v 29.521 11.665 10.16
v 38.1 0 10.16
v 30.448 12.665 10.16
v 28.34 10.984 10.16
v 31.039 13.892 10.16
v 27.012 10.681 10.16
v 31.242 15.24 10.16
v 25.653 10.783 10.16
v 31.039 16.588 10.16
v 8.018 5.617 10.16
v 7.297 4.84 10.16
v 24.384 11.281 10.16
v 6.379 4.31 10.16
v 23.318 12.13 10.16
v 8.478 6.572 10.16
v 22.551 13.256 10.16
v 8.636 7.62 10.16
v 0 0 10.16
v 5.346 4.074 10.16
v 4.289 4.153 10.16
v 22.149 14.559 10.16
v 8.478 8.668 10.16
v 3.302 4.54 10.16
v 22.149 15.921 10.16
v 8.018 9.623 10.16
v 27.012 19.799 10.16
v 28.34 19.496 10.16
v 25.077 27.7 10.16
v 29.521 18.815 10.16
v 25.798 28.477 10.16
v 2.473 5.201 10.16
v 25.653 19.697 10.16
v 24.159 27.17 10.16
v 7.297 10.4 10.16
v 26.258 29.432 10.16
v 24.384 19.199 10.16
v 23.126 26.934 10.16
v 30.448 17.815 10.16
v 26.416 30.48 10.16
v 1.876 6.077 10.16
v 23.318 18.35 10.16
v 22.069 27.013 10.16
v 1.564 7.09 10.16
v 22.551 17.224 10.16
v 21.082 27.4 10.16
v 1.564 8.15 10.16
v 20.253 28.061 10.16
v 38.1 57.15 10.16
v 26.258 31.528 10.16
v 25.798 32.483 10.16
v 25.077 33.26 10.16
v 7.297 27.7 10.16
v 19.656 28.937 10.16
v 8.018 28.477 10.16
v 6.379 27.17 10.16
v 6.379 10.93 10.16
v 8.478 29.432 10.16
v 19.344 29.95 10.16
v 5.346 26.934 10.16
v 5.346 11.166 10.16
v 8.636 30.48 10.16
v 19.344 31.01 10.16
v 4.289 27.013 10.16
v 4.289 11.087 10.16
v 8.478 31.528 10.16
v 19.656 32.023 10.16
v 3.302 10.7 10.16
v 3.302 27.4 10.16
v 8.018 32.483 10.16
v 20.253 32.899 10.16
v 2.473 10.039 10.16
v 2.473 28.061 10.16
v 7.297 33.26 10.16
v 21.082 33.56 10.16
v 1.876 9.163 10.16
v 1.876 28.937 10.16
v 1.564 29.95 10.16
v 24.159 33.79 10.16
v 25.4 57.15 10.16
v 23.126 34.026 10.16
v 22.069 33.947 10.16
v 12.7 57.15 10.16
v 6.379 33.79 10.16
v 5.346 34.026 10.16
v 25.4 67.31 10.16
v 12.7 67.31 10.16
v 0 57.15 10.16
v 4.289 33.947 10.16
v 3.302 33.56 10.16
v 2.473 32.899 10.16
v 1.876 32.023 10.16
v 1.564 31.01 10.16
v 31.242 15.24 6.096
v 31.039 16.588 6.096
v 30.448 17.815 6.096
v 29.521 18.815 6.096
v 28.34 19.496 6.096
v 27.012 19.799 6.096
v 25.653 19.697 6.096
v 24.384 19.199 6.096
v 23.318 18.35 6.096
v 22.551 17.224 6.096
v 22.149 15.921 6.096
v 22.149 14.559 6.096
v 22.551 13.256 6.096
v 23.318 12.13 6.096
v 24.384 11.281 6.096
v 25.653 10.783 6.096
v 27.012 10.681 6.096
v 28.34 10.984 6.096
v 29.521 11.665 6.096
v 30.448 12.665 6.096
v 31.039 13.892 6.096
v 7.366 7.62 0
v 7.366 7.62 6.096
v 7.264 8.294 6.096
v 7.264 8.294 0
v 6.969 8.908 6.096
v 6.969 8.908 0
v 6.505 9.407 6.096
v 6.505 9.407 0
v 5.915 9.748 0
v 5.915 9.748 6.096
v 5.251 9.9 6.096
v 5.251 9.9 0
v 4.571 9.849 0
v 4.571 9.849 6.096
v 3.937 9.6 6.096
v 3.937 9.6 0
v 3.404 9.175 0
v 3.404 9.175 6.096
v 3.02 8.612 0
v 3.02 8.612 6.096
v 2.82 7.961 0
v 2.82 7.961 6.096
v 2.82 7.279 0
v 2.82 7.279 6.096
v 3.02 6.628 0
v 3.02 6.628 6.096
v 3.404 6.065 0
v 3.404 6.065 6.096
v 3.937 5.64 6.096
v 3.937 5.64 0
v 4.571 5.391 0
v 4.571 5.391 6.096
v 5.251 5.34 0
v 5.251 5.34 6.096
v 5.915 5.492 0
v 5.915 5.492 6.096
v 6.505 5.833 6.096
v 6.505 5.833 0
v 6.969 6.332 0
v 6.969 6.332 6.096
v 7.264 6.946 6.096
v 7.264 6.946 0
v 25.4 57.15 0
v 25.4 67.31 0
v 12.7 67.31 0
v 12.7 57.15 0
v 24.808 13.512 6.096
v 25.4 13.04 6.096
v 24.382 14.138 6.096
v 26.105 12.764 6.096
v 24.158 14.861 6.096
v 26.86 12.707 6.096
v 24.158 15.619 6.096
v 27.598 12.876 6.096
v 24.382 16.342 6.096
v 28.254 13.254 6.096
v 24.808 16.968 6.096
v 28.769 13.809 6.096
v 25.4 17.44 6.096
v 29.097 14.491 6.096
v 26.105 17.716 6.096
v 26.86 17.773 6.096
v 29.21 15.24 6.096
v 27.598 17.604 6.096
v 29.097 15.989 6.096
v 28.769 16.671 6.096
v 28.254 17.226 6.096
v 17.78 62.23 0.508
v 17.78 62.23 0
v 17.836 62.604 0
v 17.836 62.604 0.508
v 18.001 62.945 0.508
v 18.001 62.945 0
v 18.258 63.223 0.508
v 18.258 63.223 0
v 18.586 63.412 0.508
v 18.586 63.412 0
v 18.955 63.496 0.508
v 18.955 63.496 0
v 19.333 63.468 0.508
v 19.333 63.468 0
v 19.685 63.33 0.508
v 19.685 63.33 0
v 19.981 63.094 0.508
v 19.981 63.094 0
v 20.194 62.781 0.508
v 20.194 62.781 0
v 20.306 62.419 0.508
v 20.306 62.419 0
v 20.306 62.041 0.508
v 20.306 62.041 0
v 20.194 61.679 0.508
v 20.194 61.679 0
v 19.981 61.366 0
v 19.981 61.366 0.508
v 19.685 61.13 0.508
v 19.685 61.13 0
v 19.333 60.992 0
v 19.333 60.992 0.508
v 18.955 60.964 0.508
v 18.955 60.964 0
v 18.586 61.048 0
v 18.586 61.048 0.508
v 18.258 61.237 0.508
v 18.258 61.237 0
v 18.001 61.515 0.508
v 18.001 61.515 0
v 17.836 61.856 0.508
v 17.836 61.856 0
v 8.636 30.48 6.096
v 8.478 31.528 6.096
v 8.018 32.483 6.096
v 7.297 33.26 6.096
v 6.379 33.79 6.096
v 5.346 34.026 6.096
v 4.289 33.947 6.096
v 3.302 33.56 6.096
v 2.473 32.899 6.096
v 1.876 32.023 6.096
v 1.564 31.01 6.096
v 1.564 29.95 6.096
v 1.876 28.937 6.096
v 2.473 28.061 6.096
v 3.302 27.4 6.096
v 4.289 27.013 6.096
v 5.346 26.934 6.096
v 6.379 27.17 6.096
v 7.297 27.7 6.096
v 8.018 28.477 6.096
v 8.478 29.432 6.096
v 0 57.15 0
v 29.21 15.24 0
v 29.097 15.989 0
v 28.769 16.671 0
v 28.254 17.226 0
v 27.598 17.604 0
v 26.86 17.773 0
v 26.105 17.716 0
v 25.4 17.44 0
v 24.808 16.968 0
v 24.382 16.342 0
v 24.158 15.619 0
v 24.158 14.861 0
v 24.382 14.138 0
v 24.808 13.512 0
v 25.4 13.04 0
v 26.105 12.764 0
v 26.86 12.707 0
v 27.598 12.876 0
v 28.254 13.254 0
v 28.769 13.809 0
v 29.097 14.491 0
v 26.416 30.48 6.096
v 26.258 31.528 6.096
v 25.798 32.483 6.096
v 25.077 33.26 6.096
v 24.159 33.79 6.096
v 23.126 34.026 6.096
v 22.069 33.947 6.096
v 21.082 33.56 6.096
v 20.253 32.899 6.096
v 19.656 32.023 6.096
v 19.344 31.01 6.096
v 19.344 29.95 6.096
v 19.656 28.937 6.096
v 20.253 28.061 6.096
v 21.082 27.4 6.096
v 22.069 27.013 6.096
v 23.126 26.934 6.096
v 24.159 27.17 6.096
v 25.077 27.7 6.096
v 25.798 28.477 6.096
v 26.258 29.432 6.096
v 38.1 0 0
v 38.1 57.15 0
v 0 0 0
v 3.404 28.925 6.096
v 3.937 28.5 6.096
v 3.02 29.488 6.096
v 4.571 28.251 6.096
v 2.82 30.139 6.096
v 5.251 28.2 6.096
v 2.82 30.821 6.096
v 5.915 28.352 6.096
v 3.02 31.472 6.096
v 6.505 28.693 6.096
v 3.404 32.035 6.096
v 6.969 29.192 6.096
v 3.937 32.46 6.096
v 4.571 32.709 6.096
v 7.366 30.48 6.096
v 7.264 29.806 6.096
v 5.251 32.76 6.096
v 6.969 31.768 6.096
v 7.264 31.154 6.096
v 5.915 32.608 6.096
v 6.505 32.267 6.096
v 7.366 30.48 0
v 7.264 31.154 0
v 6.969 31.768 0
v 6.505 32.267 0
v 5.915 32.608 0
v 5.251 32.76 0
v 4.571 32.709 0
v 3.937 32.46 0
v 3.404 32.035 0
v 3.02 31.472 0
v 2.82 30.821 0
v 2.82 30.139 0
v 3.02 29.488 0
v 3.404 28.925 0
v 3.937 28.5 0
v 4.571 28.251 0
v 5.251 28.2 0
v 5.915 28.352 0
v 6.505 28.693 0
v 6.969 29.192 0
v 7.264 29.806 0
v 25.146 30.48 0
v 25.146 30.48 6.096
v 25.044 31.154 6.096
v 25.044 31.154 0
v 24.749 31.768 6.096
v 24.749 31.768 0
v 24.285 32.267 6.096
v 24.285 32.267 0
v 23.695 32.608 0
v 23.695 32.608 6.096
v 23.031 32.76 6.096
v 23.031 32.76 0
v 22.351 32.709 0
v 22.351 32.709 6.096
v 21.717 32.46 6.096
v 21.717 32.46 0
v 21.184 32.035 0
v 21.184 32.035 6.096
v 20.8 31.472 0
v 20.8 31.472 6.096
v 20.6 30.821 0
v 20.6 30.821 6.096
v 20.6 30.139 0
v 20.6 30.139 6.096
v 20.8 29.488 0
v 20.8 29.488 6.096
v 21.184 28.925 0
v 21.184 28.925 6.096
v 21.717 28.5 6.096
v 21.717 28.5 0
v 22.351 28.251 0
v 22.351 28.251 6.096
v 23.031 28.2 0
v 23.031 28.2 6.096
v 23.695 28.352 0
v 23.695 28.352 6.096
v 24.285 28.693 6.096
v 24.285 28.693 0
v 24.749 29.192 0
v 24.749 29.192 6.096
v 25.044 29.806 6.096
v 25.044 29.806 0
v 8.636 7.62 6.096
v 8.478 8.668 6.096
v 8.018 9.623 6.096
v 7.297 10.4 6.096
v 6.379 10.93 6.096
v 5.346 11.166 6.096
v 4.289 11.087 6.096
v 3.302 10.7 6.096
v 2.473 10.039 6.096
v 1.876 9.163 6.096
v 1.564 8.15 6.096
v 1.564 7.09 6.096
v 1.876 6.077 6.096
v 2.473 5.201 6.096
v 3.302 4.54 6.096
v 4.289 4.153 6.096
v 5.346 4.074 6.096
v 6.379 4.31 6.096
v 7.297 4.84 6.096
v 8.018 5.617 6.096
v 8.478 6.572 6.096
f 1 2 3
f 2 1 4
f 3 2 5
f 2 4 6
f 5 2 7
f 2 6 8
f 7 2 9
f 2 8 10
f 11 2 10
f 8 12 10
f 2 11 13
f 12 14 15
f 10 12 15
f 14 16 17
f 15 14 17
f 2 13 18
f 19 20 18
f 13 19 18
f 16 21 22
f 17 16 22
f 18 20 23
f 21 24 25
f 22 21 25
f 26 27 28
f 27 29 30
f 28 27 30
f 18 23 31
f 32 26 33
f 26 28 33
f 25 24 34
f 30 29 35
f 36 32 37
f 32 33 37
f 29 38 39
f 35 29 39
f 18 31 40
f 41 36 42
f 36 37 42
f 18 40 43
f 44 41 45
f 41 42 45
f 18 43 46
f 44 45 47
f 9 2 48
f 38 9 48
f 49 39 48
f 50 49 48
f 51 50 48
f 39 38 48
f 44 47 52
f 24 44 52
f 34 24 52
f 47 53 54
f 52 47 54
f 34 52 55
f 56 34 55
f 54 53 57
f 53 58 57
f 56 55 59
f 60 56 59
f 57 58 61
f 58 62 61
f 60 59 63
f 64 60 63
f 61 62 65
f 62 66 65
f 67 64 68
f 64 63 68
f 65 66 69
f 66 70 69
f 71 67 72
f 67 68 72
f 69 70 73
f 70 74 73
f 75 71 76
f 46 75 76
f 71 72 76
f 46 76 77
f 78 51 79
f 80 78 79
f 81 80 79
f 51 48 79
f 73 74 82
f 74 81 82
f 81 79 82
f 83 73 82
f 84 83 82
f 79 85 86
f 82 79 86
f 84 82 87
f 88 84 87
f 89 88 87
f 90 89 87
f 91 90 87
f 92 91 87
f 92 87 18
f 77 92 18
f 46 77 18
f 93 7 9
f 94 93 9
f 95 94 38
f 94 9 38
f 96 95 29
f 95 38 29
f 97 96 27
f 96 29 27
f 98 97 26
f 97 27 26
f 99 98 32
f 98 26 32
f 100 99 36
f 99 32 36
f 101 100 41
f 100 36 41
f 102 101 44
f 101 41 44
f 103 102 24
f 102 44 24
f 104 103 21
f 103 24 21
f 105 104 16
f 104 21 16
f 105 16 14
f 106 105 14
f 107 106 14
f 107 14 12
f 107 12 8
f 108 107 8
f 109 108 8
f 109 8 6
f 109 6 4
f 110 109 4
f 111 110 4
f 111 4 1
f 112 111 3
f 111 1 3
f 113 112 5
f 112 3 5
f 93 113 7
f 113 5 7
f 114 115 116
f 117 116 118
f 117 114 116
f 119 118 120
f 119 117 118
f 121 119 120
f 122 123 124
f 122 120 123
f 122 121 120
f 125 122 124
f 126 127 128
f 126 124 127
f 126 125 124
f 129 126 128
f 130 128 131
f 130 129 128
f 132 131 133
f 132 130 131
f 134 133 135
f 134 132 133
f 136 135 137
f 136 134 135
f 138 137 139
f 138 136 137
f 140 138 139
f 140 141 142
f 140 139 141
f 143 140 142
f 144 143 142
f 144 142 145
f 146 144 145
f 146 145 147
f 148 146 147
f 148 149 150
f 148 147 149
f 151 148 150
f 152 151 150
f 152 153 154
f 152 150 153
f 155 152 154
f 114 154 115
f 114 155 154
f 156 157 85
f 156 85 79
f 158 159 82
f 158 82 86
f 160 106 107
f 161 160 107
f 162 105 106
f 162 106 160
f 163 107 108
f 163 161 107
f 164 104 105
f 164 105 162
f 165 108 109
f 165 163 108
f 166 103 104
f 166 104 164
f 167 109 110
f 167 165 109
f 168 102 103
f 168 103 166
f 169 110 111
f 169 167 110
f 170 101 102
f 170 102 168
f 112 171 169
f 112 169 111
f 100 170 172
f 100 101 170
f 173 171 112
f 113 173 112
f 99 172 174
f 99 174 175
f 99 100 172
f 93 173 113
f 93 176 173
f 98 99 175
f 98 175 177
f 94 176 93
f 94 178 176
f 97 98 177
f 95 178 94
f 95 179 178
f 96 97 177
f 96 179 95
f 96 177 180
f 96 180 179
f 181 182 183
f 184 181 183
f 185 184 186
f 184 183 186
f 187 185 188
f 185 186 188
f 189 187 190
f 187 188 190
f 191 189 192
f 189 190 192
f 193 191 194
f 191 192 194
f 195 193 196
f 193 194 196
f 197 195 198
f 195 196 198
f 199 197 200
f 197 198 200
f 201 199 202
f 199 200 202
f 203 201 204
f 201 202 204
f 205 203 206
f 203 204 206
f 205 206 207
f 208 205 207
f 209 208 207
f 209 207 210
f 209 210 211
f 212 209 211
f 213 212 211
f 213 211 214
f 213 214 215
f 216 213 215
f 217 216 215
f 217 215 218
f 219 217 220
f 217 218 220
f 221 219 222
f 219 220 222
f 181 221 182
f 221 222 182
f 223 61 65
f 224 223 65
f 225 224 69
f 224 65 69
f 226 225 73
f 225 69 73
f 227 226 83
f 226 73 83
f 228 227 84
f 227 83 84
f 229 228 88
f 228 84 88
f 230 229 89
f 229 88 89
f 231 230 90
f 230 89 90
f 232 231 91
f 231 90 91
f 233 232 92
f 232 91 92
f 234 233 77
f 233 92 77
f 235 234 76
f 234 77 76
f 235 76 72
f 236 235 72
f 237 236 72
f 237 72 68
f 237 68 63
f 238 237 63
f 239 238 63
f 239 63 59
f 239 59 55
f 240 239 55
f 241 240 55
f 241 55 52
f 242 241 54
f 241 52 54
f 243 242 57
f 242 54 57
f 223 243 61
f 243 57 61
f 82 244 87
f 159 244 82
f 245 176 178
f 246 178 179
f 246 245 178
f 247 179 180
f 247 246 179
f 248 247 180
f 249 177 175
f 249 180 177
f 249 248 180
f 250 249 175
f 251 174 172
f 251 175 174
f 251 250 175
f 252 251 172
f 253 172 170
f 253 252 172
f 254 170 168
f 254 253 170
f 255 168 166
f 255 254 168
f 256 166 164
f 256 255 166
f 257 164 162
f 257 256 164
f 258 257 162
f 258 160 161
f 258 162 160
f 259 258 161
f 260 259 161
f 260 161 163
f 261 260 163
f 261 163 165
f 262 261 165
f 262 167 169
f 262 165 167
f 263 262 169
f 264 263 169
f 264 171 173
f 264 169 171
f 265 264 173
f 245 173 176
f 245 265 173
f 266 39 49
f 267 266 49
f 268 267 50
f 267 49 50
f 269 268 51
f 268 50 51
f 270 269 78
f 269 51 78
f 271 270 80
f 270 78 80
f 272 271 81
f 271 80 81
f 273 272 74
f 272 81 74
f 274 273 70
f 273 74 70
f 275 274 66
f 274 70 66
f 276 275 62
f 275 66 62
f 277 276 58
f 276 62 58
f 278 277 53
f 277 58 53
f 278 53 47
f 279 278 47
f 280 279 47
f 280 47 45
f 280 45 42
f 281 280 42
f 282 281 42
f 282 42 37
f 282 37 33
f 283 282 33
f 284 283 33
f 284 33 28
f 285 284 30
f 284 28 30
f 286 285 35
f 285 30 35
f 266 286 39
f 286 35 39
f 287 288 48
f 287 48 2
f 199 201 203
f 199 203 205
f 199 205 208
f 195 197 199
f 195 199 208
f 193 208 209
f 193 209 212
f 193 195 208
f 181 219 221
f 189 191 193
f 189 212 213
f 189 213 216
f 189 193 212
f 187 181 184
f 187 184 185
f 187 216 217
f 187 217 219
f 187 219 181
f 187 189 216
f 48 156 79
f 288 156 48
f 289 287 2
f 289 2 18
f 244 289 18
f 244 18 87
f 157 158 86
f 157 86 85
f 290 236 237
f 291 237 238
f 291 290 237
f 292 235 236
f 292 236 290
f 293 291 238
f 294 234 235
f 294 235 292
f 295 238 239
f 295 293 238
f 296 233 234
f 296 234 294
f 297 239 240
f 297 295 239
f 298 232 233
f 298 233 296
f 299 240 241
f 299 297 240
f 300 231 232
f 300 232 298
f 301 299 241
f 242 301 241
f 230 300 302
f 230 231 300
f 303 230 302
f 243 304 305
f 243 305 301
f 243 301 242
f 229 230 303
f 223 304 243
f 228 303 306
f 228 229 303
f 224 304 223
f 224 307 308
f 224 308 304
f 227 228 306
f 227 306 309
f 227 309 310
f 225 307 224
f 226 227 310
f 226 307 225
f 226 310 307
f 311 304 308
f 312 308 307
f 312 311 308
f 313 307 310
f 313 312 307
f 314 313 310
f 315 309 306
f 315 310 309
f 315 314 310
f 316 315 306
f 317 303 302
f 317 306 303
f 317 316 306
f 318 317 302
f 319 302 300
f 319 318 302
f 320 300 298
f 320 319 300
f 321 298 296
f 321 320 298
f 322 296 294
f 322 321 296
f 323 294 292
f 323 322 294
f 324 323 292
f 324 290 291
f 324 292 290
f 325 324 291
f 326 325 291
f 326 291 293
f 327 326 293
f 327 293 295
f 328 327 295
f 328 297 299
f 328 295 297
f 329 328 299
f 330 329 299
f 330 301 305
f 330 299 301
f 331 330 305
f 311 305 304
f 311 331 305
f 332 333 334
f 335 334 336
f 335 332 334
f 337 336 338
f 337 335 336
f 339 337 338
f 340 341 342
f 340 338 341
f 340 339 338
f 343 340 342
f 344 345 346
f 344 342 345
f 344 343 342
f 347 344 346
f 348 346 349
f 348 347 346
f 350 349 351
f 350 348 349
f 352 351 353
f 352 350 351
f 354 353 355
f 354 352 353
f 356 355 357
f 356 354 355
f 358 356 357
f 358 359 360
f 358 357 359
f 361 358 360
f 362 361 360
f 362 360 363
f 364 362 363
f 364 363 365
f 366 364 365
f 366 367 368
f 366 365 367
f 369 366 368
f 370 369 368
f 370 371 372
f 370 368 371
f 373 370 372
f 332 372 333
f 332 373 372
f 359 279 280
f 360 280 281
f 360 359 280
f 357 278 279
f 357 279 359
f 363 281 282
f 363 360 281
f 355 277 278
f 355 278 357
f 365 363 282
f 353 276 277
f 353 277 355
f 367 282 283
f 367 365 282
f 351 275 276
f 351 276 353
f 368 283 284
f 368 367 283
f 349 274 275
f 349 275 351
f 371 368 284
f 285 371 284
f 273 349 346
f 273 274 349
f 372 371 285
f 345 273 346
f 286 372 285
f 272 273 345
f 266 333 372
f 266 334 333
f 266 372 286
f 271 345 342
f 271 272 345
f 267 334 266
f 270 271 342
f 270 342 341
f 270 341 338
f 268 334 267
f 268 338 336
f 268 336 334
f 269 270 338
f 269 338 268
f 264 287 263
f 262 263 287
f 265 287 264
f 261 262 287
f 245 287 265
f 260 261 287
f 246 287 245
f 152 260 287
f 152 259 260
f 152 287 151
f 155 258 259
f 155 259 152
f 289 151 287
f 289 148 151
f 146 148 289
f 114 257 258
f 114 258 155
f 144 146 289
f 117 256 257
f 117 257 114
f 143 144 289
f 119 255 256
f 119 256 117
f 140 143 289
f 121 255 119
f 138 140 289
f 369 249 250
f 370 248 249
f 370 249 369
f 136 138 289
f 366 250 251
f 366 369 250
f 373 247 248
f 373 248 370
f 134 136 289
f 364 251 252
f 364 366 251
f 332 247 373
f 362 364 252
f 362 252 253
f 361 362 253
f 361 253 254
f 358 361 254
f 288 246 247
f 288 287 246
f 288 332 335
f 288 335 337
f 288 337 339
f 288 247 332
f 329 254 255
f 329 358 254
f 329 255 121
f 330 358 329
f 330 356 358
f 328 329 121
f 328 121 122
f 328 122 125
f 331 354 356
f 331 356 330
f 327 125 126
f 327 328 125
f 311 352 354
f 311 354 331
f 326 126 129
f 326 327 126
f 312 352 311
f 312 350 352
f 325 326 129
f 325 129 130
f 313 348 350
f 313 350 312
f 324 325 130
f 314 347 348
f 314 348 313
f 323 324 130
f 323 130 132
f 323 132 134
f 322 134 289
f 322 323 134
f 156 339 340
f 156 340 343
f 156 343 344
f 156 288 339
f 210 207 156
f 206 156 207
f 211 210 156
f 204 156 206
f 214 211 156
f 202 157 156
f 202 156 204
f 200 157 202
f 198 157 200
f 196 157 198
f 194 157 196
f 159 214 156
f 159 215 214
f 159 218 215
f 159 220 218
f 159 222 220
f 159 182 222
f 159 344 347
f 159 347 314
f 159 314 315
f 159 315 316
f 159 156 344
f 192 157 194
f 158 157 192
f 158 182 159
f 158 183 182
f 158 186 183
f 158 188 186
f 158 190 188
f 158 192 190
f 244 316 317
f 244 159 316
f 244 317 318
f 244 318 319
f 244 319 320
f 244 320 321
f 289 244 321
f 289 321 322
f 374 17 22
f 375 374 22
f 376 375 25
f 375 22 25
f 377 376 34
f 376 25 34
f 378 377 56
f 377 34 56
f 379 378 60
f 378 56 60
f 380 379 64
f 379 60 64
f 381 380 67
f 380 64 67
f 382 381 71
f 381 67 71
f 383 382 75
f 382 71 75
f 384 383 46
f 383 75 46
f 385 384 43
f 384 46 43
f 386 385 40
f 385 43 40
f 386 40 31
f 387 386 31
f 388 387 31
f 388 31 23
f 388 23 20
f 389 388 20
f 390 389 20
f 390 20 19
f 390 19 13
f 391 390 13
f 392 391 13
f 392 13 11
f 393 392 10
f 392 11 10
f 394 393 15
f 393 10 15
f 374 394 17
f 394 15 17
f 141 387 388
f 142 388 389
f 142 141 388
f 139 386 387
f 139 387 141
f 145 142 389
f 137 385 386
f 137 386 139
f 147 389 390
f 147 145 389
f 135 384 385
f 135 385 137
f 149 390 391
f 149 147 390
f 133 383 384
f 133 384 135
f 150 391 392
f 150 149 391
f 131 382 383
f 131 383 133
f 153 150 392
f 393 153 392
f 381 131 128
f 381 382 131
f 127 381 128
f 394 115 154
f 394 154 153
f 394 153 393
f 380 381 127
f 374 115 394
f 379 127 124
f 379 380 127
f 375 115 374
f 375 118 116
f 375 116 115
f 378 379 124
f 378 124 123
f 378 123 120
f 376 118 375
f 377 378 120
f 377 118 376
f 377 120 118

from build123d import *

# Parameters (mm, degrees)
SKETCH1_R           = 2.286
SKETCH1_R_2         = 2.54
BOSS_EXTRUDE1_DEPTH = 10.16
SKETCH7_R           = 3.556
SKETCH7_R_2         = 4.572
CUT_EXTRUDE1_DEPTH  = 4.064
SKETCH3_R           = 1.27
CUT_EXTRUDE2_DEPTH  = 0.508


with BuildPart() as part:
    # Sketch1 → Boss-Extrude1 (new body)
    with BuildSketch(Plane.XY):
        Polygon((0, 57.15), (12.7, 57.15), (12.7, 67.31), (25.4, 67.31), (25.4, 57.15), (38.1, 57.15), (38.1, 0), (0, 0), align=None)
        with Locations((5.08, 7.62)):
            Circle(SKETCH1_R, mode=Mode.SUBTRACT)
        with Locations((5.08, 30.48)):
            Circle(SKETCH1_R, mode=Mode.SUBTRACT)
        with Locations((26.67, 15.24)):
            Circle(SKETCH1_R_2, mode=Mode.SUBTRACT)
        with Locations((22.86, 30.48)):
            Circle(SKETCH1_R, mode=Mode.SUBTRACT)
    extrude(amount=BOSS_EXTRUDE1_DEPTH)

    # Sketch7 → Cut-Extrude1 (cut)
    with BuildSketch(Plane.XY.offset(10.16)):
        with Locations((5.08, 30.48)):
            Circle(SKETCH7_R)
        with Locations((22.86, 30.48)):
            Circle(SKETCH7_R)
        with Locations((5.08, 7.62)):
            Circle(SKETCH7_R)
        with Locations((26.67, 15.24)):
            Circle(SKETCH7_R_2)
    extrude(amount=-CUT_EXTRUDE1_DEPTH, mode=Mode.SUBTRACT)

    # Sketch3 → Cut-Extrude2 (cut)
    with BuildSketch(Plane(origin=(0, 0, 0), x_dir=(-1, 0, 0), z_dir=(0, 0, -1))):
        with Locations((-19.05, 62.23)):
            Circle(SKETCH3_R)
    extrude(amount=-CUT_EXTRUDE2_DEPTH, mode=Mode.SUBTRACT)


solid = part.part
